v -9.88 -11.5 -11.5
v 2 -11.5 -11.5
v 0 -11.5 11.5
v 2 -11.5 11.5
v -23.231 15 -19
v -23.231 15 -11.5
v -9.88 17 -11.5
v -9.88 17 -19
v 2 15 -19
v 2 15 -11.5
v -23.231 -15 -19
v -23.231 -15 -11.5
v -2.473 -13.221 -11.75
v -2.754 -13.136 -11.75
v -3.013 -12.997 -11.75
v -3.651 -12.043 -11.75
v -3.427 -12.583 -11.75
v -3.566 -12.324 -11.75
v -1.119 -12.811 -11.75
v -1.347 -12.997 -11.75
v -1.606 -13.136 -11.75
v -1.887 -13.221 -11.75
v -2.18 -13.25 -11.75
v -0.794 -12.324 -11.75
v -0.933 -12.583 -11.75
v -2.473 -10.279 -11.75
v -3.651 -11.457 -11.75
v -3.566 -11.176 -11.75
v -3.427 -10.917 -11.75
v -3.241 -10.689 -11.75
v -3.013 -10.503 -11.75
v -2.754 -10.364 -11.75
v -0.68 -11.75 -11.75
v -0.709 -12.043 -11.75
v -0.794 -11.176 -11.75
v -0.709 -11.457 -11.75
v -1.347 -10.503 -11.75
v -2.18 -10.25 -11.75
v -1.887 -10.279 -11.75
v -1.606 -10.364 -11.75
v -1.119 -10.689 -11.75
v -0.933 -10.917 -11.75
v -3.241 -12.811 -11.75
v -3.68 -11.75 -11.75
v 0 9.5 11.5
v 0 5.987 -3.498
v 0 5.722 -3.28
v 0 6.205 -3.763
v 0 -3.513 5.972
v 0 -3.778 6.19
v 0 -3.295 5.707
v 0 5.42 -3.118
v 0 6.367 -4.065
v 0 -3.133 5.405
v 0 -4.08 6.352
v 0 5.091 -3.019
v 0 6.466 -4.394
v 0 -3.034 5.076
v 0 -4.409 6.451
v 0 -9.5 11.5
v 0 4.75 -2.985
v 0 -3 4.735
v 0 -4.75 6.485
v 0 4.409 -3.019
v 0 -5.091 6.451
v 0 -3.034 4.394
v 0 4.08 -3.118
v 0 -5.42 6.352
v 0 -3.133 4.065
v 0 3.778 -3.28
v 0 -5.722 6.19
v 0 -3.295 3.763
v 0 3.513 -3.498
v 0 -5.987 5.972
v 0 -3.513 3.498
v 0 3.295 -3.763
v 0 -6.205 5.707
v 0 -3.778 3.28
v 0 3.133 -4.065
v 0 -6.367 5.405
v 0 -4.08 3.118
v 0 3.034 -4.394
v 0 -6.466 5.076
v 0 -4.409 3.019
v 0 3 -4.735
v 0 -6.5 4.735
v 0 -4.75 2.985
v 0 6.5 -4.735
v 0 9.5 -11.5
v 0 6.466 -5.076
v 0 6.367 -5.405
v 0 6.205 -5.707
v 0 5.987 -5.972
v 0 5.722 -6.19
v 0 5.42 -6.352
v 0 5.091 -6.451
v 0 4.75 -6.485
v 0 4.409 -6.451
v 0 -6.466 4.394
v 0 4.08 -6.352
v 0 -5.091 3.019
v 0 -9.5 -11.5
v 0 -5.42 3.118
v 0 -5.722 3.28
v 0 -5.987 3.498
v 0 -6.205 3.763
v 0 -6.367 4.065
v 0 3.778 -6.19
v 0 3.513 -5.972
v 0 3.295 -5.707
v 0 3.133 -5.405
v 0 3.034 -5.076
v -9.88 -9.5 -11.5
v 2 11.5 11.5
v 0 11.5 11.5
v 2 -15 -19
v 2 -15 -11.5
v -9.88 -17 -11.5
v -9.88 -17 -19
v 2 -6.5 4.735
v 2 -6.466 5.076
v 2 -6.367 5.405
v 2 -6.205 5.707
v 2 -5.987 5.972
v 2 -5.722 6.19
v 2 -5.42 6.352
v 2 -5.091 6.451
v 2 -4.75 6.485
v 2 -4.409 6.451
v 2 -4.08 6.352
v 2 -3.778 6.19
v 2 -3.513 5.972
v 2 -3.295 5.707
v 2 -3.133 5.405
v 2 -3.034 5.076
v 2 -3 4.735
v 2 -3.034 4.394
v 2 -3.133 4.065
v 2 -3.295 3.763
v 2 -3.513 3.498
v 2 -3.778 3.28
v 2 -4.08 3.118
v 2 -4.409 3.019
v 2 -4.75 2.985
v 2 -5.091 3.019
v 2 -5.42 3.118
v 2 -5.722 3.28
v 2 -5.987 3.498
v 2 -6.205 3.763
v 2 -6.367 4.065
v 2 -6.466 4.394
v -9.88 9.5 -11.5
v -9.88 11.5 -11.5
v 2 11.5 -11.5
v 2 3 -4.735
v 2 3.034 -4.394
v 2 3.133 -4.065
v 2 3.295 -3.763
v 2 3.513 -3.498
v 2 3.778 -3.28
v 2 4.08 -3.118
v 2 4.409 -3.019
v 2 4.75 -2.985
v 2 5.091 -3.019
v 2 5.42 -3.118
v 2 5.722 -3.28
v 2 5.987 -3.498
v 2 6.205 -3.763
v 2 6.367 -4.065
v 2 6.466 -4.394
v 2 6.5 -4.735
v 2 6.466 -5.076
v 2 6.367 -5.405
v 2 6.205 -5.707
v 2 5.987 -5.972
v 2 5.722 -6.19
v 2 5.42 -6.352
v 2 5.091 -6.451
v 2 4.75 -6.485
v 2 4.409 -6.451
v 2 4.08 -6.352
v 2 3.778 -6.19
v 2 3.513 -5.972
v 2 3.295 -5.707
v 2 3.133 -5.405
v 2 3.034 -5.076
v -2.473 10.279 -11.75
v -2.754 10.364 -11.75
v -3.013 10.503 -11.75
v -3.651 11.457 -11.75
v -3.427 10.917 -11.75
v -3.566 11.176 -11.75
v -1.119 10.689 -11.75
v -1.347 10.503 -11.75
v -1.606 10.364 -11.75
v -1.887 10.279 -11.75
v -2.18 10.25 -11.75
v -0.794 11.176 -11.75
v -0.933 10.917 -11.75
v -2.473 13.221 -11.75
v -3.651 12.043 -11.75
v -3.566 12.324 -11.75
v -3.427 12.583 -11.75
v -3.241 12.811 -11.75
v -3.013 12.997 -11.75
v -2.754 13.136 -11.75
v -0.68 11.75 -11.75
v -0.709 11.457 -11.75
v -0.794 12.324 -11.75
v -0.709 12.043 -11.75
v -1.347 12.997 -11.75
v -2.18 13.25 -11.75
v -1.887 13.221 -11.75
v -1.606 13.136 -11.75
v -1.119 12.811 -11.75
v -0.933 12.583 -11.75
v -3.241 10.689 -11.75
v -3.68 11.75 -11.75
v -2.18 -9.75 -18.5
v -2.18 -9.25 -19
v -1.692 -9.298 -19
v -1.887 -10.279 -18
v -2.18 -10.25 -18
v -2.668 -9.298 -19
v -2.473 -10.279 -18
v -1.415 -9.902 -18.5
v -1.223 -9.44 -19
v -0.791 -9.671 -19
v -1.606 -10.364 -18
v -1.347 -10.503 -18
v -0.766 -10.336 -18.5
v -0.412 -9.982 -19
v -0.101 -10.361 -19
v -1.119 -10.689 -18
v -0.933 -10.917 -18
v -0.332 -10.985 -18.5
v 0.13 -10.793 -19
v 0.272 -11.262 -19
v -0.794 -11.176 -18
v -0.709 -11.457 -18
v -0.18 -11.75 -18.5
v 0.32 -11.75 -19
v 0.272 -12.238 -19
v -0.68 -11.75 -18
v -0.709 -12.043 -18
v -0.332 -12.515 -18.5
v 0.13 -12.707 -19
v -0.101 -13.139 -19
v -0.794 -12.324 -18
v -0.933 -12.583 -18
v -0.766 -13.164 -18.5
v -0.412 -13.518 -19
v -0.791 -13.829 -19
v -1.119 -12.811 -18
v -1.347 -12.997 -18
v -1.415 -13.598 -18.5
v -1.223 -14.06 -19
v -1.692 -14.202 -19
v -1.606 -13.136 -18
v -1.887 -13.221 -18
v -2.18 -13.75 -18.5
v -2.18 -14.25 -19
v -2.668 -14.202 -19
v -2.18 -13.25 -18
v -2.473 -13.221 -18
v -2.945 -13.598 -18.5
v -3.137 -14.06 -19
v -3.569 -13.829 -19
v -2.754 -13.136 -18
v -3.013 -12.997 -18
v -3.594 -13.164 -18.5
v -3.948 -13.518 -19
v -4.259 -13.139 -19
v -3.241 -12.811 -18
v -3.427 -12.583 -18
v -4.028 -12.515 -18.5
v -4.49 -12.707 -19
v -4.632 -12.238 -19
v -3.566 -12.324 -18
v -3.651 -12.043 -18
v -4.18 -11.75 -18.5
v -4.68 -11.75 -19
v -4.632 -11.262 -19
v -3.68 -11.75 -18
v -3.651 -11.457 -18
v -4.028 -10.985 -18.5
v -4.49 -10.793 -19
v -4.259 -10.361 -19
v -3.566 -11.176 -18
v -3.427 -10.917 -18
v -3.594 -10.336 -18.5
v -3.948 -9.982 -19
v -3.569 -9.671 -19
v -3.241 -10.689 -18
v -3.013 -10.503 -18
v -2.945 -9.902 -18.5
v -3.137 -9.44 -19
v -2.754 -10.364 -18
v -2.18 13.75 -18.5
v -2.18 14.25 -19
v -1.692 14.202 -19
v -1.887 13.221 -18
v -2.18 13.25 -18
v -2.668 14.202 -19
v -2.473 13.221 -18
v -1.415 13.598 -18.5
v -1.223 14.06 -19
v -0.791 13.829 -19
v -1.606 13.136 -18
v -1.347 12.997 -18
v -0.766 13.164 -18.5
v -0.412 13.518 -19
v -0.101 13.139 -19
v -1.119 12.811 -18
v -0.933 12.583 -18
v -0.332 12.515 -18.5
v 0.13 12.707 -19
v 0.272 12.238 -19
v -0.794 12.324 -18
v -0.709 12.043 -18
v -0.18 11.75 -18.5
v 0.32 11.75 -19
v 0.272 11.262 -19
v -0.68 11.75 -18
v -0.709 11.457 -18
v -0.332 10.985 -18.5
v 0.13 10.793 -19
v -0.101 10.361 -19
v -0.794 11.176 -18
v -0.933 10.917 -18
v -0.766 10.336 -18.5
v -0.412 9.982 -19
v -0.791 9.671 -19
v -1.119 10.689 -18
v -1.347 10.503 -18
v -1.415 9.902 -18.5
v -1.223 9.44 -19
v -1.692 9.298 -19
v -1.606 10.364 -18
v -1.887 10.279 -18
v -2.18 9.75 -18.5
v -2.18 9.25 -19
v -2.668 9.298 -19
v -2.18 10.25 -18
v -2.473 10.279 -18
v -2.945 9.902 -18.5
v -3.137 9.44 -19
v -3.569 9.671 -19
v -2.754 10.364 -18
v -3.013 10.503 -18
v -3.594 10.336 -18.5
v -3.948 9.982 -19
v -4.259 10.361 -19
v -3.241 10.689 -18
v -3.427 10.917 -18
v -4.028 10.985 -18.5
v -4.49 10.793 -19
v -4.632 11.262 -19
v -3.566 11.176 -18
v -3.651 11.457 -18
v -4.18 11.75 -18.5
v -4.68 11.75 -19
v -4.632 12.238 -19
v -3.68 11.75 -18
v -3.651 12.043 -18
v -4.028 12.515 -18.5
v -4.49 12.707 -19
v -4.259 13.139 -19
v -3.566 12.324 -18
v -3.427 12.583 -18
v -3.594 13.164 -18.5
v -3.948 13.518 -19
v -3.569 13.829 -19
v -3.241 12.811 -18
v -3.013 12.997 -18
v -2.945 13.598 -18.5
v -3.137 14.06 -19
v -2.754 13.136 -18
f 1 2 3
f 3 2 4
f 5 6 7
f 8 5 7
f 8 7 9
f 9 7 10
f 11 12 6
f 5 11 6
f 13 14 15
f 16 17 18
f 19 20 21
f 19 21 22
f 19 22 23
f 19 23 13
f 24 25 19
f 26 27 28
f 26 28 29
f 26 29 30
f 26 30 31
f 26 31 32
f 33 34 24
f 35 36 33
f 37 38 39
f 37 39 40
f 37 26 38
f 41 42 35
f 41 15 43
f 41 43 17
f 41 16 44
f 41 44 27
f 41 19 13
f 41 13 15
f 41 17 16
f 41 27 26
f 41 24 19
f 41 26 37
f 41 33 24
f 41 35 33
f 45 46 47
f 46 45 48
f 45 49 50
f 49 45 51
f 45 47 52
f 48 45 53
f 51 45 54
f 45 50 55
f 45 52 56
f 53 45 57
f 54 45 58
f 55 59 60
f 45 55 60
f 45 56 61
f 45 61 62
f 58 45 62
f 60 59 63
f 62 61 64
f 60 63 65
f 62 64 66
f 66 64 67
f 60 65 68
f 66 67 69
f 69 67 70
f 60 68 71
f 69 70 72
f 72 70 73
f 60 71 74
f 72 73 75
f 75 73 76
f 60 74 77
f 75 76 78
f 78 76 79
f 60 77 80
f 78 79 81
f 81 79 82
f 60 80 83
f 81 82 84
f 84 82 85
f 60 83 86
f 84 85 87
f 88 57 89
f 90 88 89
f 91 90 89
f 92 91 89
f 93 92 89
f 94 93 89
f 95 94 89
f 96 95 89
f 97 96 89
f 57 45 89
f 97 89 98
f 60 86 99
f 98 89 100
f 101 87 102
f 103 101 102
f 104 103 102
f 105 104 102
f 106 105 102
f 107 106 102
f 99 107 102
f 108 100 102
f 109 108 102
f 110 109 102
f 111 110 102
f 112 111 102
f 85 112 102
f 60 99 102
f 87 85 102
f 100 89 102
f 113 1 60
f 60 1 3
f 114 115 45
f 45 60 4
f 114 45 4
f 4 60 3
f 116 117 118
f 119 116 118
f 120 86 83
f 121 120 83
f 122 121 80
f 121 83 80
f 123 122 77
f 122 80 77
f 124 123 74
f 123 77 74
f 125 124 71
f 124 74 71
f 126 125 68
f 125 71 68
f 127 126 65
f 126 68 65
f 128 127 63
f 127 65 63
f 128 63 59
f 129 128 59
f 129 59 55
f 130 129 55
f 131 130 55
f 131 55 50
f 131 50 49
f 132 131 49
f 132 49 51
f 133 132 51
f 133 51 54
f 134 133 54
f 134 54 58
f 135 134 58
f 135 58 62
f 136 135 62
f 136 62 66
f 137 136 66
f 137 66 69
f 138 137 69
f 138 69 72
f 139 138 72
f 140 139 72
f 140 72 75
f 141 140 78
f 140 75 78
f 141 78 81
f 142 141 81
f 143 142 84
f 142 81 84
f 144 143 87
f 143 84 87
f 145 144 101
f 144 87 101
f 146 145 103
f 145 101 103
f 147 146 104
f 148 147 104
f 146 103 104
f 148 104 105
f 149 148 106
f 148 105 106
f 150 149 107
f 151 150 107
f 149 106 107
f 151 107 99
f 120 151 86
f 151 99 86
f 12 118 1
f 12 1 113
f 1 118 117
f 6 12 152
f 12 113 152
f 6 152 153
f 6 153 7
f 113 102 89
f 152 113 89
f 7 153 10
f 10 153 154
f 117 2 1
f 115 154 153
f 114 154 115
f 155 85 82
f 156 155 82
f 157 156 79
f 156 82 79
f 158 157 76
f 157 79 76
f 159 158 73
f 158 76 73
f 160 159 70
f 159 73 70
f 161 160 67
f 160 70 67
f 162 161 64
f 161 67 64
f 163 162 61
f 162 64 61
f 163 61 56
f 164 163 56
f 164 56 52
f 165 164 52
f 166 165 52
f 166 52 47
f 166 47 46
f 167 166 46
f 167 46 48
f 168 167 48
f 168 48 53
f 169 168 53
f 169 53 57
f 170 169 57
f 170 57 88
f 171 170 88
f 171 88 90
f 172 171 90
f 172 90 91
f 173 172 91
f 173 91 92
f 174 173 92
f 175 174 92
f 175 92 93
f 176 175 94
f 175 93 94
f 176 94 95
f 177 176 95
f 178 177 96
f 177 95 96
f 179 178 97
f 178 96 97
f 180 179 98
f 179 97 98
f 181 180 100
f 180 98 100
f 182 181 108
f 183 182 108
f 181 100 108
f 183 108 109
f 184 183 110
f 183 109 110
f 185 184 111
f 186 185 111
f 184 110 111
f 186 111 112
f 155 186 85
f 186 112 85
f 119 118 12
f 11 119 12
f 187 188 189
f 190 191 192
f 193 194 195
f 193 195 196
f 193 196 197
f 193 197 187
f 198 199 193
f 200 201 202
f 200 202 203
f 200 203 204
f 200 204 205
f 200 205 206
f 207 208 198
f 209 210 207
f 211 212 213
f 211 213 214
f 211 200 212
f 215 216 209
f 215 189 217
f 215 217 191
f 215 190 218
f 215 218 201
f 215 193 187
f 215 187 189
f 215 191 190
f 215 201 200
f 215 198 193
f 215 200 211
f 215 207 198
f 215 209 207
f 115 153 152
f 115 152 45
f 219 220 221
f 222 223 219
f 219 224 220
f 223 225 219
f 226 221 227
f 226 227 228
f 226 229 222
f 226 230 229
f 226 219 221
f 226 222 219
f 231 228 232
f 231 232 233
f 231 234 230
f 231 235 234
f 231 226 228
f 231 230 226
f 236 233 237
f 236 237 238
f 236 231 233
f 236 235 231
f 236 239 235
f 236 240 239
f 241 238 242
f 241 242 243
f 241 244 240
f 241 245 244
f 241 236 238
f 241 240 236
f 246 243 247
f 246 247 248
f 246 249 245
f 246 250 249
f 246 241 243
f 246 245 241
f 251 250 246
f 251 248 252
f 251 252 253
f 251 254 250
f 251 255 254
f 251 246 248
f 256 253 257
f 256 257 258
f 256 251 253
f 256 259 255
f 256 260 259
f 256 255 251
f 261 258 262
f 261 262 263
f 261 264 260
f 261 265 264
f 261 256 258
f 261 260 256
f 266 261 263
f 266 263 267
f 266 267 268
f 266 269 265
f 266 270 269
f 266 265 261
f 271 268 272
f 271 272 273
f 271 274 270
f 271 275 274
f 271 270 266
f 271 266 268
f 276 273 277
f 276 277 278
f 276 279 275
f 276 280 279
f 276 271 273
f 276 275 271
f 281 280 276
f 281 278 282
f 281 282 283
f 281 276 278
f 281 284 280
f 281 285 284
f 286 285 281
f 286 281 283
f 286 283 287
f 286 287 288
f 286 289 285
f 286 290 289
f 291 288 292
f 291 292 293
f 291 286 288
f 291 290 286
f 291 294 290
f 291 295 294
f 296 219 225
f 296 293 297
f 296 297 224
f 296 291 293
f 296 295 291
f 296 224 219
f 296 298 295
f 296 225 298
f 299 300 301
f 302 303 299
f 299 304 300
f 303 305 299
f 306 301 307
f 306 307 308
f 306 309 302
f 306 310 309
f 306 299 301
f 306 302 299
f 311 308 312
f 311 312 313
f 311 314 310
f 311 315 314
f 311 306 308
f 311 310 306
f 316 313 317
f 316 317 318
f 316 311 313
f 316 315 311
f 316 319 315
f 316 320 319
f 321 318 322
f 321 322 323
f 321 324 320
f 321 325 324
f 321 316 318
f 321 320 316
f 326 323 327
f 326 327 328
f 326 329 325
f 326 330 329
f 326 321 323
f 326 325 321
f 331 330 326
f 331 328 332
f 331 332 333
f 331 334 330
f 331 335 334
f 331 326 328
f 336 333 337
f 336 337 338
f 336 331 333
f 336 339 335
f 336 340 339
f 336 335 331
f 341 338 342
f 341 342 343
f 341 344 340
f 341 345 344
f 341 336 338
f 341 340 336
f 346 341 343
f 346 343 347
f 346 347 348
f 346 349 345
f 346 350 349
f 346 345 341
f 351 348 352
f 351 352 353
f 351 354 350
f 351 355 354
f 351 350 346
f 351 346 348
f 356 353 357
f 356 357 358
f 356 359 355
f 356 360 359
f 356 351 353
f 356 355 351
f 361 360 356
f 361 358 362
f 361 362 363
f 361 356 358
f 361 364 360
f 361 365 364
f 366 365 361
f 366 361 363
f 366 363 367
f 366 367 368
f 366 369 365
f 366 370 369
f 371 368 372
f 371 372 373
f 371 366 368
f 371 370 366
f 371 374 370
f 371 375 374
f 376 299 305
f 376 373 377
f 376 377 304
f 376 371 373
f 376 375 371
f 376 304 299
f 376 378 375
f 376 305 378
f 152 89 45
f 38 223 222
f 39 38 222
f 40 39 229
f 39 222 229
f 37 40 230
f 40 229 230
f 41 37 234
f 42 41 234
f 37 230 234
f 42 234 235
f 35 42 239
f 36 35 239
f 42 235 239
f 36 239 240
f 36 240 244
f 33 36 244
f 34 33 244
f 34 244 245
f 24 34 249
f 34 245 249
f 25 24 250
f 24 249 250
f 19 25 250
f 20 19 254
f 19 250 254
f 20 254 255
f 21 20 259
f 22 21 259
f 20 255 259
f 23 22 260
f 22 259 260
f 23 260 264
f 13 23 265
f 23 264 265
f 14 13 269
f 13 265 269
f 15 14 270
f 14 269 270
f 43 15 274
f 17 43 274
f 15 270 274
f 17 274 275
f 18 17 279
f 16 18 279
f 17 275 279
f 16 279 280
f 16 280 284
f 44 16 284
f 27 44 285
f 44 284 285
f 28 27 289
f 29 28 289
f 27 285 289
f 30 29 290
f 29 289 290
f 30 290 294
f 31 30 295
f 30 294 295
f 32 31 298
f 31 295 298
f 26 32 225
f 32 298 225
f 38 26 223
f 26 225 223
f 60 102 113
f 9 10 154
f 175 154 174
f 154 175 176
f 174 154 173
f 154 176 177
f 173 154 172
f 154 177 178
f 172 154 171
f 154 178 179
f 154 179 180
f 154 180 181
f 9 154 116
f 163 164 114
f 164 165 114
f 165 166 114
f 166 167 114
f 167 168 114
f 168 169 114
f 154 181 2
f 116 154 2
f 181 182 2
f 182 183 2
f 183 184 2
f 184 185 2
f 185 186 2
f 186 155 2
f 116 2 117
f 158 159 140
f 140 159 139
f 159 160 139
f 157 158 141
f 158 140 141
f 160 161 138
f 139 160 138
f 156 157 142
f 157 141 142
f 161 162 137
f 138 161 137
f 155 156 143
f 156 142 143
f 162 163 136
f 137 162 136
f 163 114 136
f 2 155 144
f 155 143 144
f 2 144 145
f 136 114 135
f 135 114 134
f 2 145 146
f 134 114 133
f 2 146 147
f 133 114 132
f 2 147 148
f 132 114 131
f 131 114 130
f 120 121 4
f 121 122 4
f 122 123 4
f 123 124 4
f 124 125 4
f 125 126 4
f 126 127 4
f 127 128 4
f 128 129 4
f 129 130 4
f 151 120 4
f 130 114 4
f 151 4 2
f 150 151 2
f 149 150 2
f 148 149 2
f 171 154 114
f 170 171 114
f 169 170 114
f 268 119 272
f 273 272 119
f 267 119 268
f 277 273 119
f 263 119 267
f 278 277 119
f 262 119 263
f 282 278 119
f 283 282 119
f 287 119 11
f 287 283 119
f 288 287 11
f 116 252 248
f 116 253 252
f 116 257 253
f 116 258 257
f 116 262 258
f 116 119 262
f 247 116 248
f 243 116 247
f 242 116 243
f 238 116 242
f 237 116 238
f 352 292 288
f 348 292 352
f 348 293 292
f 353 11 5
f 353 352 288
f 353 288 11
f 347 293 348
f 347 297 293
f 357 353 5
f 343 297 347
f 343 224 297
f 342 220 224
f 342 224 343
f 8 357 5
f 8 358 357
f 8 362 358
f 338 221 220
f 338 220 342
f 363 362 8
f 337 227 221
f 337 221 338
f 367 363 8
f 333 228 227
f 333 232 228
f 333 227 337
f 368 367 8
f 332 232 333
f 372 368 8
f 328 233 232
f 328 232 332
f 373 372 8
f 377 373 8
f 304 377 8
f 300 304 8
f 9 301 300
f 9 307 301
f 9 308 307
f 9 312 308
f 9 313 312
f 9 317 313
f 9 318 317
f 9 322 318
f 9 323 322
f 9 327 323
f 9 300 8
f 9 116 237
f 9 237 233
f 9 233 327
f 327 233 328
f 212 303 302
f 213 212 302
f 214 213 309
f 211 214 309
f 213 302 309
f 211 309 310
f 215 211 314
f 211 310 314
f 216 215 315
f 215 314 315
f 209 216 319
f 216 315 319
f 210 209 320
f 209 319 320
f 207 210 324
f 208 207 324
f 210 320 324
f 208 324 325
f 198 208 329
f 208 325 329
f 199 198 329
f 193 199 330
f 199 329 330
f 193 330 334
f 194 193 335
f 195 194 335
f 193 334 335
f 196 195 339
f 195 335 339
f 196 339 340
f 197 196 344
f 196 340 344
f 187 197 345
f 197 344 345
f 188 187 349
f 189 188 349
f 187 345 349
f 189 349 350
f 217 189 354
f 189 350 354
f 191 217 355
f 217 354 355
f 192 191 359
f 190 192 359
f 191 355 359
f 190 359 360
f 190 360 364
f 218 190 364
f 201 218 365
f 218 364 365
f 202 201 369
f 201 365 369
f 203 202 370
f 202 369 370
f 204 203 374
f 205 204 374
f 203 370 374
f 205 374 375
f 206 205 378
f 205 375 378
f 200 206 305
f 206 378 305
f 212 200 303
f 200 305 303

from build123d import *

# Parameters (mm, degrees)
SKETCH_W                = 23
SKETCH_H                = 23
PAD_DEPTH               = 2
PAD001_DEPTH            = 7.5
SKETCH016_R             = 1.5
POCKET_DEPTH            = 7.25
SKETCH012_R             = 1.75
POCKET001_DEPTH         = 5
PAD002_DEPTH            = 2
CHAMFER_SIZE            = 1
BODY001_PLACEMENT_ANGLE = 180


with BuildPart() as part:
    # Sketch → Pad (new body)
    with BuildSketch(Plane.YZ):
        Rectangle(SKETCH_W, SKETCH_H)
    extrude(amount=PAD_DEPTH)

    # Sketch017 (on Face4 of Pad) → Pad001 (join)
    with BuildSketch(Plane(origin=(0, 0, 11.5), x_dir=(0, -1, 0), z_dir=(0, 0, 1))):
        Polygon((-15, -23.23103), (15, -23.23103), (17, -9.88), (15, 2), (-15, 2), (-17, -9.88), align=None)
    extrude(amount=PAD001_DEPTH)

    # Sketch016 (on Face13 of Pad001) → Pocket (cut)
    with BuildSketch(Plane(origin=(0, 0, 19), x_dir=(0, -1, 0), z_dir=(0, 0, 1))):
        with Locations((11.75, -2.18)):
            Circle(SKETCH016_R)
        with Locations((-11.75, -2.18)):
            Circle(SKETCH016_R)
    extrude(amount=-POCKET_DEPTH, mode=Mode.SUBTRACT)

    # Sketch012 (on Face4 of Pad001) → Pocket001 (cut)
    with BuildSketch(Plane(origin=(0, 0, 0), x_dir=(0, 1, 0), z_dir=(-1, 0, 0))):
        with Locations((-4.75, -4.735)):
            Circle(SKETCH012_R)
        with Locations((4.75, 4.735)):
            Circle(SKETCH012_R)
    extrude(amount=-POCKET001_DEPTH, mode=Mode.SUBTRACT)

    # Sketch018 (on Face1 of Pocket001) → Pad002 (join)
    with BuildSketch(Plane(origin=(0, -11.5, 0), x_dir=(0, 0, -1), z_dir=(0, -1, 0))):
        Polygon((-11.5, -9.88), (11.5, 0), (-11.5, 0), align=None)
    pad002 = extrude(amount=-PAD002_DEPTH)

    # Mirrored: Pad002 across XZ
    add(pad002.mirror(Plane.XZ))

    # Chamfer
    chamfer_edges = [part.edges().sort_by_distance(p)[0] for p in [
        (-2.18, 13.25, 19),
        (-2.18, -10.25, 19),
    ]]
    chamfer(chamfer_edges, length=CHAMFER_SIZE)


with BuildPart() as part_1:
    # Body001 placement: moved
    add(part.part.rotate(Axis((0, 0, 0), (1, 0, 0)), BODY001_PLACEMENT_ANGLE))


solid = part_1.part
